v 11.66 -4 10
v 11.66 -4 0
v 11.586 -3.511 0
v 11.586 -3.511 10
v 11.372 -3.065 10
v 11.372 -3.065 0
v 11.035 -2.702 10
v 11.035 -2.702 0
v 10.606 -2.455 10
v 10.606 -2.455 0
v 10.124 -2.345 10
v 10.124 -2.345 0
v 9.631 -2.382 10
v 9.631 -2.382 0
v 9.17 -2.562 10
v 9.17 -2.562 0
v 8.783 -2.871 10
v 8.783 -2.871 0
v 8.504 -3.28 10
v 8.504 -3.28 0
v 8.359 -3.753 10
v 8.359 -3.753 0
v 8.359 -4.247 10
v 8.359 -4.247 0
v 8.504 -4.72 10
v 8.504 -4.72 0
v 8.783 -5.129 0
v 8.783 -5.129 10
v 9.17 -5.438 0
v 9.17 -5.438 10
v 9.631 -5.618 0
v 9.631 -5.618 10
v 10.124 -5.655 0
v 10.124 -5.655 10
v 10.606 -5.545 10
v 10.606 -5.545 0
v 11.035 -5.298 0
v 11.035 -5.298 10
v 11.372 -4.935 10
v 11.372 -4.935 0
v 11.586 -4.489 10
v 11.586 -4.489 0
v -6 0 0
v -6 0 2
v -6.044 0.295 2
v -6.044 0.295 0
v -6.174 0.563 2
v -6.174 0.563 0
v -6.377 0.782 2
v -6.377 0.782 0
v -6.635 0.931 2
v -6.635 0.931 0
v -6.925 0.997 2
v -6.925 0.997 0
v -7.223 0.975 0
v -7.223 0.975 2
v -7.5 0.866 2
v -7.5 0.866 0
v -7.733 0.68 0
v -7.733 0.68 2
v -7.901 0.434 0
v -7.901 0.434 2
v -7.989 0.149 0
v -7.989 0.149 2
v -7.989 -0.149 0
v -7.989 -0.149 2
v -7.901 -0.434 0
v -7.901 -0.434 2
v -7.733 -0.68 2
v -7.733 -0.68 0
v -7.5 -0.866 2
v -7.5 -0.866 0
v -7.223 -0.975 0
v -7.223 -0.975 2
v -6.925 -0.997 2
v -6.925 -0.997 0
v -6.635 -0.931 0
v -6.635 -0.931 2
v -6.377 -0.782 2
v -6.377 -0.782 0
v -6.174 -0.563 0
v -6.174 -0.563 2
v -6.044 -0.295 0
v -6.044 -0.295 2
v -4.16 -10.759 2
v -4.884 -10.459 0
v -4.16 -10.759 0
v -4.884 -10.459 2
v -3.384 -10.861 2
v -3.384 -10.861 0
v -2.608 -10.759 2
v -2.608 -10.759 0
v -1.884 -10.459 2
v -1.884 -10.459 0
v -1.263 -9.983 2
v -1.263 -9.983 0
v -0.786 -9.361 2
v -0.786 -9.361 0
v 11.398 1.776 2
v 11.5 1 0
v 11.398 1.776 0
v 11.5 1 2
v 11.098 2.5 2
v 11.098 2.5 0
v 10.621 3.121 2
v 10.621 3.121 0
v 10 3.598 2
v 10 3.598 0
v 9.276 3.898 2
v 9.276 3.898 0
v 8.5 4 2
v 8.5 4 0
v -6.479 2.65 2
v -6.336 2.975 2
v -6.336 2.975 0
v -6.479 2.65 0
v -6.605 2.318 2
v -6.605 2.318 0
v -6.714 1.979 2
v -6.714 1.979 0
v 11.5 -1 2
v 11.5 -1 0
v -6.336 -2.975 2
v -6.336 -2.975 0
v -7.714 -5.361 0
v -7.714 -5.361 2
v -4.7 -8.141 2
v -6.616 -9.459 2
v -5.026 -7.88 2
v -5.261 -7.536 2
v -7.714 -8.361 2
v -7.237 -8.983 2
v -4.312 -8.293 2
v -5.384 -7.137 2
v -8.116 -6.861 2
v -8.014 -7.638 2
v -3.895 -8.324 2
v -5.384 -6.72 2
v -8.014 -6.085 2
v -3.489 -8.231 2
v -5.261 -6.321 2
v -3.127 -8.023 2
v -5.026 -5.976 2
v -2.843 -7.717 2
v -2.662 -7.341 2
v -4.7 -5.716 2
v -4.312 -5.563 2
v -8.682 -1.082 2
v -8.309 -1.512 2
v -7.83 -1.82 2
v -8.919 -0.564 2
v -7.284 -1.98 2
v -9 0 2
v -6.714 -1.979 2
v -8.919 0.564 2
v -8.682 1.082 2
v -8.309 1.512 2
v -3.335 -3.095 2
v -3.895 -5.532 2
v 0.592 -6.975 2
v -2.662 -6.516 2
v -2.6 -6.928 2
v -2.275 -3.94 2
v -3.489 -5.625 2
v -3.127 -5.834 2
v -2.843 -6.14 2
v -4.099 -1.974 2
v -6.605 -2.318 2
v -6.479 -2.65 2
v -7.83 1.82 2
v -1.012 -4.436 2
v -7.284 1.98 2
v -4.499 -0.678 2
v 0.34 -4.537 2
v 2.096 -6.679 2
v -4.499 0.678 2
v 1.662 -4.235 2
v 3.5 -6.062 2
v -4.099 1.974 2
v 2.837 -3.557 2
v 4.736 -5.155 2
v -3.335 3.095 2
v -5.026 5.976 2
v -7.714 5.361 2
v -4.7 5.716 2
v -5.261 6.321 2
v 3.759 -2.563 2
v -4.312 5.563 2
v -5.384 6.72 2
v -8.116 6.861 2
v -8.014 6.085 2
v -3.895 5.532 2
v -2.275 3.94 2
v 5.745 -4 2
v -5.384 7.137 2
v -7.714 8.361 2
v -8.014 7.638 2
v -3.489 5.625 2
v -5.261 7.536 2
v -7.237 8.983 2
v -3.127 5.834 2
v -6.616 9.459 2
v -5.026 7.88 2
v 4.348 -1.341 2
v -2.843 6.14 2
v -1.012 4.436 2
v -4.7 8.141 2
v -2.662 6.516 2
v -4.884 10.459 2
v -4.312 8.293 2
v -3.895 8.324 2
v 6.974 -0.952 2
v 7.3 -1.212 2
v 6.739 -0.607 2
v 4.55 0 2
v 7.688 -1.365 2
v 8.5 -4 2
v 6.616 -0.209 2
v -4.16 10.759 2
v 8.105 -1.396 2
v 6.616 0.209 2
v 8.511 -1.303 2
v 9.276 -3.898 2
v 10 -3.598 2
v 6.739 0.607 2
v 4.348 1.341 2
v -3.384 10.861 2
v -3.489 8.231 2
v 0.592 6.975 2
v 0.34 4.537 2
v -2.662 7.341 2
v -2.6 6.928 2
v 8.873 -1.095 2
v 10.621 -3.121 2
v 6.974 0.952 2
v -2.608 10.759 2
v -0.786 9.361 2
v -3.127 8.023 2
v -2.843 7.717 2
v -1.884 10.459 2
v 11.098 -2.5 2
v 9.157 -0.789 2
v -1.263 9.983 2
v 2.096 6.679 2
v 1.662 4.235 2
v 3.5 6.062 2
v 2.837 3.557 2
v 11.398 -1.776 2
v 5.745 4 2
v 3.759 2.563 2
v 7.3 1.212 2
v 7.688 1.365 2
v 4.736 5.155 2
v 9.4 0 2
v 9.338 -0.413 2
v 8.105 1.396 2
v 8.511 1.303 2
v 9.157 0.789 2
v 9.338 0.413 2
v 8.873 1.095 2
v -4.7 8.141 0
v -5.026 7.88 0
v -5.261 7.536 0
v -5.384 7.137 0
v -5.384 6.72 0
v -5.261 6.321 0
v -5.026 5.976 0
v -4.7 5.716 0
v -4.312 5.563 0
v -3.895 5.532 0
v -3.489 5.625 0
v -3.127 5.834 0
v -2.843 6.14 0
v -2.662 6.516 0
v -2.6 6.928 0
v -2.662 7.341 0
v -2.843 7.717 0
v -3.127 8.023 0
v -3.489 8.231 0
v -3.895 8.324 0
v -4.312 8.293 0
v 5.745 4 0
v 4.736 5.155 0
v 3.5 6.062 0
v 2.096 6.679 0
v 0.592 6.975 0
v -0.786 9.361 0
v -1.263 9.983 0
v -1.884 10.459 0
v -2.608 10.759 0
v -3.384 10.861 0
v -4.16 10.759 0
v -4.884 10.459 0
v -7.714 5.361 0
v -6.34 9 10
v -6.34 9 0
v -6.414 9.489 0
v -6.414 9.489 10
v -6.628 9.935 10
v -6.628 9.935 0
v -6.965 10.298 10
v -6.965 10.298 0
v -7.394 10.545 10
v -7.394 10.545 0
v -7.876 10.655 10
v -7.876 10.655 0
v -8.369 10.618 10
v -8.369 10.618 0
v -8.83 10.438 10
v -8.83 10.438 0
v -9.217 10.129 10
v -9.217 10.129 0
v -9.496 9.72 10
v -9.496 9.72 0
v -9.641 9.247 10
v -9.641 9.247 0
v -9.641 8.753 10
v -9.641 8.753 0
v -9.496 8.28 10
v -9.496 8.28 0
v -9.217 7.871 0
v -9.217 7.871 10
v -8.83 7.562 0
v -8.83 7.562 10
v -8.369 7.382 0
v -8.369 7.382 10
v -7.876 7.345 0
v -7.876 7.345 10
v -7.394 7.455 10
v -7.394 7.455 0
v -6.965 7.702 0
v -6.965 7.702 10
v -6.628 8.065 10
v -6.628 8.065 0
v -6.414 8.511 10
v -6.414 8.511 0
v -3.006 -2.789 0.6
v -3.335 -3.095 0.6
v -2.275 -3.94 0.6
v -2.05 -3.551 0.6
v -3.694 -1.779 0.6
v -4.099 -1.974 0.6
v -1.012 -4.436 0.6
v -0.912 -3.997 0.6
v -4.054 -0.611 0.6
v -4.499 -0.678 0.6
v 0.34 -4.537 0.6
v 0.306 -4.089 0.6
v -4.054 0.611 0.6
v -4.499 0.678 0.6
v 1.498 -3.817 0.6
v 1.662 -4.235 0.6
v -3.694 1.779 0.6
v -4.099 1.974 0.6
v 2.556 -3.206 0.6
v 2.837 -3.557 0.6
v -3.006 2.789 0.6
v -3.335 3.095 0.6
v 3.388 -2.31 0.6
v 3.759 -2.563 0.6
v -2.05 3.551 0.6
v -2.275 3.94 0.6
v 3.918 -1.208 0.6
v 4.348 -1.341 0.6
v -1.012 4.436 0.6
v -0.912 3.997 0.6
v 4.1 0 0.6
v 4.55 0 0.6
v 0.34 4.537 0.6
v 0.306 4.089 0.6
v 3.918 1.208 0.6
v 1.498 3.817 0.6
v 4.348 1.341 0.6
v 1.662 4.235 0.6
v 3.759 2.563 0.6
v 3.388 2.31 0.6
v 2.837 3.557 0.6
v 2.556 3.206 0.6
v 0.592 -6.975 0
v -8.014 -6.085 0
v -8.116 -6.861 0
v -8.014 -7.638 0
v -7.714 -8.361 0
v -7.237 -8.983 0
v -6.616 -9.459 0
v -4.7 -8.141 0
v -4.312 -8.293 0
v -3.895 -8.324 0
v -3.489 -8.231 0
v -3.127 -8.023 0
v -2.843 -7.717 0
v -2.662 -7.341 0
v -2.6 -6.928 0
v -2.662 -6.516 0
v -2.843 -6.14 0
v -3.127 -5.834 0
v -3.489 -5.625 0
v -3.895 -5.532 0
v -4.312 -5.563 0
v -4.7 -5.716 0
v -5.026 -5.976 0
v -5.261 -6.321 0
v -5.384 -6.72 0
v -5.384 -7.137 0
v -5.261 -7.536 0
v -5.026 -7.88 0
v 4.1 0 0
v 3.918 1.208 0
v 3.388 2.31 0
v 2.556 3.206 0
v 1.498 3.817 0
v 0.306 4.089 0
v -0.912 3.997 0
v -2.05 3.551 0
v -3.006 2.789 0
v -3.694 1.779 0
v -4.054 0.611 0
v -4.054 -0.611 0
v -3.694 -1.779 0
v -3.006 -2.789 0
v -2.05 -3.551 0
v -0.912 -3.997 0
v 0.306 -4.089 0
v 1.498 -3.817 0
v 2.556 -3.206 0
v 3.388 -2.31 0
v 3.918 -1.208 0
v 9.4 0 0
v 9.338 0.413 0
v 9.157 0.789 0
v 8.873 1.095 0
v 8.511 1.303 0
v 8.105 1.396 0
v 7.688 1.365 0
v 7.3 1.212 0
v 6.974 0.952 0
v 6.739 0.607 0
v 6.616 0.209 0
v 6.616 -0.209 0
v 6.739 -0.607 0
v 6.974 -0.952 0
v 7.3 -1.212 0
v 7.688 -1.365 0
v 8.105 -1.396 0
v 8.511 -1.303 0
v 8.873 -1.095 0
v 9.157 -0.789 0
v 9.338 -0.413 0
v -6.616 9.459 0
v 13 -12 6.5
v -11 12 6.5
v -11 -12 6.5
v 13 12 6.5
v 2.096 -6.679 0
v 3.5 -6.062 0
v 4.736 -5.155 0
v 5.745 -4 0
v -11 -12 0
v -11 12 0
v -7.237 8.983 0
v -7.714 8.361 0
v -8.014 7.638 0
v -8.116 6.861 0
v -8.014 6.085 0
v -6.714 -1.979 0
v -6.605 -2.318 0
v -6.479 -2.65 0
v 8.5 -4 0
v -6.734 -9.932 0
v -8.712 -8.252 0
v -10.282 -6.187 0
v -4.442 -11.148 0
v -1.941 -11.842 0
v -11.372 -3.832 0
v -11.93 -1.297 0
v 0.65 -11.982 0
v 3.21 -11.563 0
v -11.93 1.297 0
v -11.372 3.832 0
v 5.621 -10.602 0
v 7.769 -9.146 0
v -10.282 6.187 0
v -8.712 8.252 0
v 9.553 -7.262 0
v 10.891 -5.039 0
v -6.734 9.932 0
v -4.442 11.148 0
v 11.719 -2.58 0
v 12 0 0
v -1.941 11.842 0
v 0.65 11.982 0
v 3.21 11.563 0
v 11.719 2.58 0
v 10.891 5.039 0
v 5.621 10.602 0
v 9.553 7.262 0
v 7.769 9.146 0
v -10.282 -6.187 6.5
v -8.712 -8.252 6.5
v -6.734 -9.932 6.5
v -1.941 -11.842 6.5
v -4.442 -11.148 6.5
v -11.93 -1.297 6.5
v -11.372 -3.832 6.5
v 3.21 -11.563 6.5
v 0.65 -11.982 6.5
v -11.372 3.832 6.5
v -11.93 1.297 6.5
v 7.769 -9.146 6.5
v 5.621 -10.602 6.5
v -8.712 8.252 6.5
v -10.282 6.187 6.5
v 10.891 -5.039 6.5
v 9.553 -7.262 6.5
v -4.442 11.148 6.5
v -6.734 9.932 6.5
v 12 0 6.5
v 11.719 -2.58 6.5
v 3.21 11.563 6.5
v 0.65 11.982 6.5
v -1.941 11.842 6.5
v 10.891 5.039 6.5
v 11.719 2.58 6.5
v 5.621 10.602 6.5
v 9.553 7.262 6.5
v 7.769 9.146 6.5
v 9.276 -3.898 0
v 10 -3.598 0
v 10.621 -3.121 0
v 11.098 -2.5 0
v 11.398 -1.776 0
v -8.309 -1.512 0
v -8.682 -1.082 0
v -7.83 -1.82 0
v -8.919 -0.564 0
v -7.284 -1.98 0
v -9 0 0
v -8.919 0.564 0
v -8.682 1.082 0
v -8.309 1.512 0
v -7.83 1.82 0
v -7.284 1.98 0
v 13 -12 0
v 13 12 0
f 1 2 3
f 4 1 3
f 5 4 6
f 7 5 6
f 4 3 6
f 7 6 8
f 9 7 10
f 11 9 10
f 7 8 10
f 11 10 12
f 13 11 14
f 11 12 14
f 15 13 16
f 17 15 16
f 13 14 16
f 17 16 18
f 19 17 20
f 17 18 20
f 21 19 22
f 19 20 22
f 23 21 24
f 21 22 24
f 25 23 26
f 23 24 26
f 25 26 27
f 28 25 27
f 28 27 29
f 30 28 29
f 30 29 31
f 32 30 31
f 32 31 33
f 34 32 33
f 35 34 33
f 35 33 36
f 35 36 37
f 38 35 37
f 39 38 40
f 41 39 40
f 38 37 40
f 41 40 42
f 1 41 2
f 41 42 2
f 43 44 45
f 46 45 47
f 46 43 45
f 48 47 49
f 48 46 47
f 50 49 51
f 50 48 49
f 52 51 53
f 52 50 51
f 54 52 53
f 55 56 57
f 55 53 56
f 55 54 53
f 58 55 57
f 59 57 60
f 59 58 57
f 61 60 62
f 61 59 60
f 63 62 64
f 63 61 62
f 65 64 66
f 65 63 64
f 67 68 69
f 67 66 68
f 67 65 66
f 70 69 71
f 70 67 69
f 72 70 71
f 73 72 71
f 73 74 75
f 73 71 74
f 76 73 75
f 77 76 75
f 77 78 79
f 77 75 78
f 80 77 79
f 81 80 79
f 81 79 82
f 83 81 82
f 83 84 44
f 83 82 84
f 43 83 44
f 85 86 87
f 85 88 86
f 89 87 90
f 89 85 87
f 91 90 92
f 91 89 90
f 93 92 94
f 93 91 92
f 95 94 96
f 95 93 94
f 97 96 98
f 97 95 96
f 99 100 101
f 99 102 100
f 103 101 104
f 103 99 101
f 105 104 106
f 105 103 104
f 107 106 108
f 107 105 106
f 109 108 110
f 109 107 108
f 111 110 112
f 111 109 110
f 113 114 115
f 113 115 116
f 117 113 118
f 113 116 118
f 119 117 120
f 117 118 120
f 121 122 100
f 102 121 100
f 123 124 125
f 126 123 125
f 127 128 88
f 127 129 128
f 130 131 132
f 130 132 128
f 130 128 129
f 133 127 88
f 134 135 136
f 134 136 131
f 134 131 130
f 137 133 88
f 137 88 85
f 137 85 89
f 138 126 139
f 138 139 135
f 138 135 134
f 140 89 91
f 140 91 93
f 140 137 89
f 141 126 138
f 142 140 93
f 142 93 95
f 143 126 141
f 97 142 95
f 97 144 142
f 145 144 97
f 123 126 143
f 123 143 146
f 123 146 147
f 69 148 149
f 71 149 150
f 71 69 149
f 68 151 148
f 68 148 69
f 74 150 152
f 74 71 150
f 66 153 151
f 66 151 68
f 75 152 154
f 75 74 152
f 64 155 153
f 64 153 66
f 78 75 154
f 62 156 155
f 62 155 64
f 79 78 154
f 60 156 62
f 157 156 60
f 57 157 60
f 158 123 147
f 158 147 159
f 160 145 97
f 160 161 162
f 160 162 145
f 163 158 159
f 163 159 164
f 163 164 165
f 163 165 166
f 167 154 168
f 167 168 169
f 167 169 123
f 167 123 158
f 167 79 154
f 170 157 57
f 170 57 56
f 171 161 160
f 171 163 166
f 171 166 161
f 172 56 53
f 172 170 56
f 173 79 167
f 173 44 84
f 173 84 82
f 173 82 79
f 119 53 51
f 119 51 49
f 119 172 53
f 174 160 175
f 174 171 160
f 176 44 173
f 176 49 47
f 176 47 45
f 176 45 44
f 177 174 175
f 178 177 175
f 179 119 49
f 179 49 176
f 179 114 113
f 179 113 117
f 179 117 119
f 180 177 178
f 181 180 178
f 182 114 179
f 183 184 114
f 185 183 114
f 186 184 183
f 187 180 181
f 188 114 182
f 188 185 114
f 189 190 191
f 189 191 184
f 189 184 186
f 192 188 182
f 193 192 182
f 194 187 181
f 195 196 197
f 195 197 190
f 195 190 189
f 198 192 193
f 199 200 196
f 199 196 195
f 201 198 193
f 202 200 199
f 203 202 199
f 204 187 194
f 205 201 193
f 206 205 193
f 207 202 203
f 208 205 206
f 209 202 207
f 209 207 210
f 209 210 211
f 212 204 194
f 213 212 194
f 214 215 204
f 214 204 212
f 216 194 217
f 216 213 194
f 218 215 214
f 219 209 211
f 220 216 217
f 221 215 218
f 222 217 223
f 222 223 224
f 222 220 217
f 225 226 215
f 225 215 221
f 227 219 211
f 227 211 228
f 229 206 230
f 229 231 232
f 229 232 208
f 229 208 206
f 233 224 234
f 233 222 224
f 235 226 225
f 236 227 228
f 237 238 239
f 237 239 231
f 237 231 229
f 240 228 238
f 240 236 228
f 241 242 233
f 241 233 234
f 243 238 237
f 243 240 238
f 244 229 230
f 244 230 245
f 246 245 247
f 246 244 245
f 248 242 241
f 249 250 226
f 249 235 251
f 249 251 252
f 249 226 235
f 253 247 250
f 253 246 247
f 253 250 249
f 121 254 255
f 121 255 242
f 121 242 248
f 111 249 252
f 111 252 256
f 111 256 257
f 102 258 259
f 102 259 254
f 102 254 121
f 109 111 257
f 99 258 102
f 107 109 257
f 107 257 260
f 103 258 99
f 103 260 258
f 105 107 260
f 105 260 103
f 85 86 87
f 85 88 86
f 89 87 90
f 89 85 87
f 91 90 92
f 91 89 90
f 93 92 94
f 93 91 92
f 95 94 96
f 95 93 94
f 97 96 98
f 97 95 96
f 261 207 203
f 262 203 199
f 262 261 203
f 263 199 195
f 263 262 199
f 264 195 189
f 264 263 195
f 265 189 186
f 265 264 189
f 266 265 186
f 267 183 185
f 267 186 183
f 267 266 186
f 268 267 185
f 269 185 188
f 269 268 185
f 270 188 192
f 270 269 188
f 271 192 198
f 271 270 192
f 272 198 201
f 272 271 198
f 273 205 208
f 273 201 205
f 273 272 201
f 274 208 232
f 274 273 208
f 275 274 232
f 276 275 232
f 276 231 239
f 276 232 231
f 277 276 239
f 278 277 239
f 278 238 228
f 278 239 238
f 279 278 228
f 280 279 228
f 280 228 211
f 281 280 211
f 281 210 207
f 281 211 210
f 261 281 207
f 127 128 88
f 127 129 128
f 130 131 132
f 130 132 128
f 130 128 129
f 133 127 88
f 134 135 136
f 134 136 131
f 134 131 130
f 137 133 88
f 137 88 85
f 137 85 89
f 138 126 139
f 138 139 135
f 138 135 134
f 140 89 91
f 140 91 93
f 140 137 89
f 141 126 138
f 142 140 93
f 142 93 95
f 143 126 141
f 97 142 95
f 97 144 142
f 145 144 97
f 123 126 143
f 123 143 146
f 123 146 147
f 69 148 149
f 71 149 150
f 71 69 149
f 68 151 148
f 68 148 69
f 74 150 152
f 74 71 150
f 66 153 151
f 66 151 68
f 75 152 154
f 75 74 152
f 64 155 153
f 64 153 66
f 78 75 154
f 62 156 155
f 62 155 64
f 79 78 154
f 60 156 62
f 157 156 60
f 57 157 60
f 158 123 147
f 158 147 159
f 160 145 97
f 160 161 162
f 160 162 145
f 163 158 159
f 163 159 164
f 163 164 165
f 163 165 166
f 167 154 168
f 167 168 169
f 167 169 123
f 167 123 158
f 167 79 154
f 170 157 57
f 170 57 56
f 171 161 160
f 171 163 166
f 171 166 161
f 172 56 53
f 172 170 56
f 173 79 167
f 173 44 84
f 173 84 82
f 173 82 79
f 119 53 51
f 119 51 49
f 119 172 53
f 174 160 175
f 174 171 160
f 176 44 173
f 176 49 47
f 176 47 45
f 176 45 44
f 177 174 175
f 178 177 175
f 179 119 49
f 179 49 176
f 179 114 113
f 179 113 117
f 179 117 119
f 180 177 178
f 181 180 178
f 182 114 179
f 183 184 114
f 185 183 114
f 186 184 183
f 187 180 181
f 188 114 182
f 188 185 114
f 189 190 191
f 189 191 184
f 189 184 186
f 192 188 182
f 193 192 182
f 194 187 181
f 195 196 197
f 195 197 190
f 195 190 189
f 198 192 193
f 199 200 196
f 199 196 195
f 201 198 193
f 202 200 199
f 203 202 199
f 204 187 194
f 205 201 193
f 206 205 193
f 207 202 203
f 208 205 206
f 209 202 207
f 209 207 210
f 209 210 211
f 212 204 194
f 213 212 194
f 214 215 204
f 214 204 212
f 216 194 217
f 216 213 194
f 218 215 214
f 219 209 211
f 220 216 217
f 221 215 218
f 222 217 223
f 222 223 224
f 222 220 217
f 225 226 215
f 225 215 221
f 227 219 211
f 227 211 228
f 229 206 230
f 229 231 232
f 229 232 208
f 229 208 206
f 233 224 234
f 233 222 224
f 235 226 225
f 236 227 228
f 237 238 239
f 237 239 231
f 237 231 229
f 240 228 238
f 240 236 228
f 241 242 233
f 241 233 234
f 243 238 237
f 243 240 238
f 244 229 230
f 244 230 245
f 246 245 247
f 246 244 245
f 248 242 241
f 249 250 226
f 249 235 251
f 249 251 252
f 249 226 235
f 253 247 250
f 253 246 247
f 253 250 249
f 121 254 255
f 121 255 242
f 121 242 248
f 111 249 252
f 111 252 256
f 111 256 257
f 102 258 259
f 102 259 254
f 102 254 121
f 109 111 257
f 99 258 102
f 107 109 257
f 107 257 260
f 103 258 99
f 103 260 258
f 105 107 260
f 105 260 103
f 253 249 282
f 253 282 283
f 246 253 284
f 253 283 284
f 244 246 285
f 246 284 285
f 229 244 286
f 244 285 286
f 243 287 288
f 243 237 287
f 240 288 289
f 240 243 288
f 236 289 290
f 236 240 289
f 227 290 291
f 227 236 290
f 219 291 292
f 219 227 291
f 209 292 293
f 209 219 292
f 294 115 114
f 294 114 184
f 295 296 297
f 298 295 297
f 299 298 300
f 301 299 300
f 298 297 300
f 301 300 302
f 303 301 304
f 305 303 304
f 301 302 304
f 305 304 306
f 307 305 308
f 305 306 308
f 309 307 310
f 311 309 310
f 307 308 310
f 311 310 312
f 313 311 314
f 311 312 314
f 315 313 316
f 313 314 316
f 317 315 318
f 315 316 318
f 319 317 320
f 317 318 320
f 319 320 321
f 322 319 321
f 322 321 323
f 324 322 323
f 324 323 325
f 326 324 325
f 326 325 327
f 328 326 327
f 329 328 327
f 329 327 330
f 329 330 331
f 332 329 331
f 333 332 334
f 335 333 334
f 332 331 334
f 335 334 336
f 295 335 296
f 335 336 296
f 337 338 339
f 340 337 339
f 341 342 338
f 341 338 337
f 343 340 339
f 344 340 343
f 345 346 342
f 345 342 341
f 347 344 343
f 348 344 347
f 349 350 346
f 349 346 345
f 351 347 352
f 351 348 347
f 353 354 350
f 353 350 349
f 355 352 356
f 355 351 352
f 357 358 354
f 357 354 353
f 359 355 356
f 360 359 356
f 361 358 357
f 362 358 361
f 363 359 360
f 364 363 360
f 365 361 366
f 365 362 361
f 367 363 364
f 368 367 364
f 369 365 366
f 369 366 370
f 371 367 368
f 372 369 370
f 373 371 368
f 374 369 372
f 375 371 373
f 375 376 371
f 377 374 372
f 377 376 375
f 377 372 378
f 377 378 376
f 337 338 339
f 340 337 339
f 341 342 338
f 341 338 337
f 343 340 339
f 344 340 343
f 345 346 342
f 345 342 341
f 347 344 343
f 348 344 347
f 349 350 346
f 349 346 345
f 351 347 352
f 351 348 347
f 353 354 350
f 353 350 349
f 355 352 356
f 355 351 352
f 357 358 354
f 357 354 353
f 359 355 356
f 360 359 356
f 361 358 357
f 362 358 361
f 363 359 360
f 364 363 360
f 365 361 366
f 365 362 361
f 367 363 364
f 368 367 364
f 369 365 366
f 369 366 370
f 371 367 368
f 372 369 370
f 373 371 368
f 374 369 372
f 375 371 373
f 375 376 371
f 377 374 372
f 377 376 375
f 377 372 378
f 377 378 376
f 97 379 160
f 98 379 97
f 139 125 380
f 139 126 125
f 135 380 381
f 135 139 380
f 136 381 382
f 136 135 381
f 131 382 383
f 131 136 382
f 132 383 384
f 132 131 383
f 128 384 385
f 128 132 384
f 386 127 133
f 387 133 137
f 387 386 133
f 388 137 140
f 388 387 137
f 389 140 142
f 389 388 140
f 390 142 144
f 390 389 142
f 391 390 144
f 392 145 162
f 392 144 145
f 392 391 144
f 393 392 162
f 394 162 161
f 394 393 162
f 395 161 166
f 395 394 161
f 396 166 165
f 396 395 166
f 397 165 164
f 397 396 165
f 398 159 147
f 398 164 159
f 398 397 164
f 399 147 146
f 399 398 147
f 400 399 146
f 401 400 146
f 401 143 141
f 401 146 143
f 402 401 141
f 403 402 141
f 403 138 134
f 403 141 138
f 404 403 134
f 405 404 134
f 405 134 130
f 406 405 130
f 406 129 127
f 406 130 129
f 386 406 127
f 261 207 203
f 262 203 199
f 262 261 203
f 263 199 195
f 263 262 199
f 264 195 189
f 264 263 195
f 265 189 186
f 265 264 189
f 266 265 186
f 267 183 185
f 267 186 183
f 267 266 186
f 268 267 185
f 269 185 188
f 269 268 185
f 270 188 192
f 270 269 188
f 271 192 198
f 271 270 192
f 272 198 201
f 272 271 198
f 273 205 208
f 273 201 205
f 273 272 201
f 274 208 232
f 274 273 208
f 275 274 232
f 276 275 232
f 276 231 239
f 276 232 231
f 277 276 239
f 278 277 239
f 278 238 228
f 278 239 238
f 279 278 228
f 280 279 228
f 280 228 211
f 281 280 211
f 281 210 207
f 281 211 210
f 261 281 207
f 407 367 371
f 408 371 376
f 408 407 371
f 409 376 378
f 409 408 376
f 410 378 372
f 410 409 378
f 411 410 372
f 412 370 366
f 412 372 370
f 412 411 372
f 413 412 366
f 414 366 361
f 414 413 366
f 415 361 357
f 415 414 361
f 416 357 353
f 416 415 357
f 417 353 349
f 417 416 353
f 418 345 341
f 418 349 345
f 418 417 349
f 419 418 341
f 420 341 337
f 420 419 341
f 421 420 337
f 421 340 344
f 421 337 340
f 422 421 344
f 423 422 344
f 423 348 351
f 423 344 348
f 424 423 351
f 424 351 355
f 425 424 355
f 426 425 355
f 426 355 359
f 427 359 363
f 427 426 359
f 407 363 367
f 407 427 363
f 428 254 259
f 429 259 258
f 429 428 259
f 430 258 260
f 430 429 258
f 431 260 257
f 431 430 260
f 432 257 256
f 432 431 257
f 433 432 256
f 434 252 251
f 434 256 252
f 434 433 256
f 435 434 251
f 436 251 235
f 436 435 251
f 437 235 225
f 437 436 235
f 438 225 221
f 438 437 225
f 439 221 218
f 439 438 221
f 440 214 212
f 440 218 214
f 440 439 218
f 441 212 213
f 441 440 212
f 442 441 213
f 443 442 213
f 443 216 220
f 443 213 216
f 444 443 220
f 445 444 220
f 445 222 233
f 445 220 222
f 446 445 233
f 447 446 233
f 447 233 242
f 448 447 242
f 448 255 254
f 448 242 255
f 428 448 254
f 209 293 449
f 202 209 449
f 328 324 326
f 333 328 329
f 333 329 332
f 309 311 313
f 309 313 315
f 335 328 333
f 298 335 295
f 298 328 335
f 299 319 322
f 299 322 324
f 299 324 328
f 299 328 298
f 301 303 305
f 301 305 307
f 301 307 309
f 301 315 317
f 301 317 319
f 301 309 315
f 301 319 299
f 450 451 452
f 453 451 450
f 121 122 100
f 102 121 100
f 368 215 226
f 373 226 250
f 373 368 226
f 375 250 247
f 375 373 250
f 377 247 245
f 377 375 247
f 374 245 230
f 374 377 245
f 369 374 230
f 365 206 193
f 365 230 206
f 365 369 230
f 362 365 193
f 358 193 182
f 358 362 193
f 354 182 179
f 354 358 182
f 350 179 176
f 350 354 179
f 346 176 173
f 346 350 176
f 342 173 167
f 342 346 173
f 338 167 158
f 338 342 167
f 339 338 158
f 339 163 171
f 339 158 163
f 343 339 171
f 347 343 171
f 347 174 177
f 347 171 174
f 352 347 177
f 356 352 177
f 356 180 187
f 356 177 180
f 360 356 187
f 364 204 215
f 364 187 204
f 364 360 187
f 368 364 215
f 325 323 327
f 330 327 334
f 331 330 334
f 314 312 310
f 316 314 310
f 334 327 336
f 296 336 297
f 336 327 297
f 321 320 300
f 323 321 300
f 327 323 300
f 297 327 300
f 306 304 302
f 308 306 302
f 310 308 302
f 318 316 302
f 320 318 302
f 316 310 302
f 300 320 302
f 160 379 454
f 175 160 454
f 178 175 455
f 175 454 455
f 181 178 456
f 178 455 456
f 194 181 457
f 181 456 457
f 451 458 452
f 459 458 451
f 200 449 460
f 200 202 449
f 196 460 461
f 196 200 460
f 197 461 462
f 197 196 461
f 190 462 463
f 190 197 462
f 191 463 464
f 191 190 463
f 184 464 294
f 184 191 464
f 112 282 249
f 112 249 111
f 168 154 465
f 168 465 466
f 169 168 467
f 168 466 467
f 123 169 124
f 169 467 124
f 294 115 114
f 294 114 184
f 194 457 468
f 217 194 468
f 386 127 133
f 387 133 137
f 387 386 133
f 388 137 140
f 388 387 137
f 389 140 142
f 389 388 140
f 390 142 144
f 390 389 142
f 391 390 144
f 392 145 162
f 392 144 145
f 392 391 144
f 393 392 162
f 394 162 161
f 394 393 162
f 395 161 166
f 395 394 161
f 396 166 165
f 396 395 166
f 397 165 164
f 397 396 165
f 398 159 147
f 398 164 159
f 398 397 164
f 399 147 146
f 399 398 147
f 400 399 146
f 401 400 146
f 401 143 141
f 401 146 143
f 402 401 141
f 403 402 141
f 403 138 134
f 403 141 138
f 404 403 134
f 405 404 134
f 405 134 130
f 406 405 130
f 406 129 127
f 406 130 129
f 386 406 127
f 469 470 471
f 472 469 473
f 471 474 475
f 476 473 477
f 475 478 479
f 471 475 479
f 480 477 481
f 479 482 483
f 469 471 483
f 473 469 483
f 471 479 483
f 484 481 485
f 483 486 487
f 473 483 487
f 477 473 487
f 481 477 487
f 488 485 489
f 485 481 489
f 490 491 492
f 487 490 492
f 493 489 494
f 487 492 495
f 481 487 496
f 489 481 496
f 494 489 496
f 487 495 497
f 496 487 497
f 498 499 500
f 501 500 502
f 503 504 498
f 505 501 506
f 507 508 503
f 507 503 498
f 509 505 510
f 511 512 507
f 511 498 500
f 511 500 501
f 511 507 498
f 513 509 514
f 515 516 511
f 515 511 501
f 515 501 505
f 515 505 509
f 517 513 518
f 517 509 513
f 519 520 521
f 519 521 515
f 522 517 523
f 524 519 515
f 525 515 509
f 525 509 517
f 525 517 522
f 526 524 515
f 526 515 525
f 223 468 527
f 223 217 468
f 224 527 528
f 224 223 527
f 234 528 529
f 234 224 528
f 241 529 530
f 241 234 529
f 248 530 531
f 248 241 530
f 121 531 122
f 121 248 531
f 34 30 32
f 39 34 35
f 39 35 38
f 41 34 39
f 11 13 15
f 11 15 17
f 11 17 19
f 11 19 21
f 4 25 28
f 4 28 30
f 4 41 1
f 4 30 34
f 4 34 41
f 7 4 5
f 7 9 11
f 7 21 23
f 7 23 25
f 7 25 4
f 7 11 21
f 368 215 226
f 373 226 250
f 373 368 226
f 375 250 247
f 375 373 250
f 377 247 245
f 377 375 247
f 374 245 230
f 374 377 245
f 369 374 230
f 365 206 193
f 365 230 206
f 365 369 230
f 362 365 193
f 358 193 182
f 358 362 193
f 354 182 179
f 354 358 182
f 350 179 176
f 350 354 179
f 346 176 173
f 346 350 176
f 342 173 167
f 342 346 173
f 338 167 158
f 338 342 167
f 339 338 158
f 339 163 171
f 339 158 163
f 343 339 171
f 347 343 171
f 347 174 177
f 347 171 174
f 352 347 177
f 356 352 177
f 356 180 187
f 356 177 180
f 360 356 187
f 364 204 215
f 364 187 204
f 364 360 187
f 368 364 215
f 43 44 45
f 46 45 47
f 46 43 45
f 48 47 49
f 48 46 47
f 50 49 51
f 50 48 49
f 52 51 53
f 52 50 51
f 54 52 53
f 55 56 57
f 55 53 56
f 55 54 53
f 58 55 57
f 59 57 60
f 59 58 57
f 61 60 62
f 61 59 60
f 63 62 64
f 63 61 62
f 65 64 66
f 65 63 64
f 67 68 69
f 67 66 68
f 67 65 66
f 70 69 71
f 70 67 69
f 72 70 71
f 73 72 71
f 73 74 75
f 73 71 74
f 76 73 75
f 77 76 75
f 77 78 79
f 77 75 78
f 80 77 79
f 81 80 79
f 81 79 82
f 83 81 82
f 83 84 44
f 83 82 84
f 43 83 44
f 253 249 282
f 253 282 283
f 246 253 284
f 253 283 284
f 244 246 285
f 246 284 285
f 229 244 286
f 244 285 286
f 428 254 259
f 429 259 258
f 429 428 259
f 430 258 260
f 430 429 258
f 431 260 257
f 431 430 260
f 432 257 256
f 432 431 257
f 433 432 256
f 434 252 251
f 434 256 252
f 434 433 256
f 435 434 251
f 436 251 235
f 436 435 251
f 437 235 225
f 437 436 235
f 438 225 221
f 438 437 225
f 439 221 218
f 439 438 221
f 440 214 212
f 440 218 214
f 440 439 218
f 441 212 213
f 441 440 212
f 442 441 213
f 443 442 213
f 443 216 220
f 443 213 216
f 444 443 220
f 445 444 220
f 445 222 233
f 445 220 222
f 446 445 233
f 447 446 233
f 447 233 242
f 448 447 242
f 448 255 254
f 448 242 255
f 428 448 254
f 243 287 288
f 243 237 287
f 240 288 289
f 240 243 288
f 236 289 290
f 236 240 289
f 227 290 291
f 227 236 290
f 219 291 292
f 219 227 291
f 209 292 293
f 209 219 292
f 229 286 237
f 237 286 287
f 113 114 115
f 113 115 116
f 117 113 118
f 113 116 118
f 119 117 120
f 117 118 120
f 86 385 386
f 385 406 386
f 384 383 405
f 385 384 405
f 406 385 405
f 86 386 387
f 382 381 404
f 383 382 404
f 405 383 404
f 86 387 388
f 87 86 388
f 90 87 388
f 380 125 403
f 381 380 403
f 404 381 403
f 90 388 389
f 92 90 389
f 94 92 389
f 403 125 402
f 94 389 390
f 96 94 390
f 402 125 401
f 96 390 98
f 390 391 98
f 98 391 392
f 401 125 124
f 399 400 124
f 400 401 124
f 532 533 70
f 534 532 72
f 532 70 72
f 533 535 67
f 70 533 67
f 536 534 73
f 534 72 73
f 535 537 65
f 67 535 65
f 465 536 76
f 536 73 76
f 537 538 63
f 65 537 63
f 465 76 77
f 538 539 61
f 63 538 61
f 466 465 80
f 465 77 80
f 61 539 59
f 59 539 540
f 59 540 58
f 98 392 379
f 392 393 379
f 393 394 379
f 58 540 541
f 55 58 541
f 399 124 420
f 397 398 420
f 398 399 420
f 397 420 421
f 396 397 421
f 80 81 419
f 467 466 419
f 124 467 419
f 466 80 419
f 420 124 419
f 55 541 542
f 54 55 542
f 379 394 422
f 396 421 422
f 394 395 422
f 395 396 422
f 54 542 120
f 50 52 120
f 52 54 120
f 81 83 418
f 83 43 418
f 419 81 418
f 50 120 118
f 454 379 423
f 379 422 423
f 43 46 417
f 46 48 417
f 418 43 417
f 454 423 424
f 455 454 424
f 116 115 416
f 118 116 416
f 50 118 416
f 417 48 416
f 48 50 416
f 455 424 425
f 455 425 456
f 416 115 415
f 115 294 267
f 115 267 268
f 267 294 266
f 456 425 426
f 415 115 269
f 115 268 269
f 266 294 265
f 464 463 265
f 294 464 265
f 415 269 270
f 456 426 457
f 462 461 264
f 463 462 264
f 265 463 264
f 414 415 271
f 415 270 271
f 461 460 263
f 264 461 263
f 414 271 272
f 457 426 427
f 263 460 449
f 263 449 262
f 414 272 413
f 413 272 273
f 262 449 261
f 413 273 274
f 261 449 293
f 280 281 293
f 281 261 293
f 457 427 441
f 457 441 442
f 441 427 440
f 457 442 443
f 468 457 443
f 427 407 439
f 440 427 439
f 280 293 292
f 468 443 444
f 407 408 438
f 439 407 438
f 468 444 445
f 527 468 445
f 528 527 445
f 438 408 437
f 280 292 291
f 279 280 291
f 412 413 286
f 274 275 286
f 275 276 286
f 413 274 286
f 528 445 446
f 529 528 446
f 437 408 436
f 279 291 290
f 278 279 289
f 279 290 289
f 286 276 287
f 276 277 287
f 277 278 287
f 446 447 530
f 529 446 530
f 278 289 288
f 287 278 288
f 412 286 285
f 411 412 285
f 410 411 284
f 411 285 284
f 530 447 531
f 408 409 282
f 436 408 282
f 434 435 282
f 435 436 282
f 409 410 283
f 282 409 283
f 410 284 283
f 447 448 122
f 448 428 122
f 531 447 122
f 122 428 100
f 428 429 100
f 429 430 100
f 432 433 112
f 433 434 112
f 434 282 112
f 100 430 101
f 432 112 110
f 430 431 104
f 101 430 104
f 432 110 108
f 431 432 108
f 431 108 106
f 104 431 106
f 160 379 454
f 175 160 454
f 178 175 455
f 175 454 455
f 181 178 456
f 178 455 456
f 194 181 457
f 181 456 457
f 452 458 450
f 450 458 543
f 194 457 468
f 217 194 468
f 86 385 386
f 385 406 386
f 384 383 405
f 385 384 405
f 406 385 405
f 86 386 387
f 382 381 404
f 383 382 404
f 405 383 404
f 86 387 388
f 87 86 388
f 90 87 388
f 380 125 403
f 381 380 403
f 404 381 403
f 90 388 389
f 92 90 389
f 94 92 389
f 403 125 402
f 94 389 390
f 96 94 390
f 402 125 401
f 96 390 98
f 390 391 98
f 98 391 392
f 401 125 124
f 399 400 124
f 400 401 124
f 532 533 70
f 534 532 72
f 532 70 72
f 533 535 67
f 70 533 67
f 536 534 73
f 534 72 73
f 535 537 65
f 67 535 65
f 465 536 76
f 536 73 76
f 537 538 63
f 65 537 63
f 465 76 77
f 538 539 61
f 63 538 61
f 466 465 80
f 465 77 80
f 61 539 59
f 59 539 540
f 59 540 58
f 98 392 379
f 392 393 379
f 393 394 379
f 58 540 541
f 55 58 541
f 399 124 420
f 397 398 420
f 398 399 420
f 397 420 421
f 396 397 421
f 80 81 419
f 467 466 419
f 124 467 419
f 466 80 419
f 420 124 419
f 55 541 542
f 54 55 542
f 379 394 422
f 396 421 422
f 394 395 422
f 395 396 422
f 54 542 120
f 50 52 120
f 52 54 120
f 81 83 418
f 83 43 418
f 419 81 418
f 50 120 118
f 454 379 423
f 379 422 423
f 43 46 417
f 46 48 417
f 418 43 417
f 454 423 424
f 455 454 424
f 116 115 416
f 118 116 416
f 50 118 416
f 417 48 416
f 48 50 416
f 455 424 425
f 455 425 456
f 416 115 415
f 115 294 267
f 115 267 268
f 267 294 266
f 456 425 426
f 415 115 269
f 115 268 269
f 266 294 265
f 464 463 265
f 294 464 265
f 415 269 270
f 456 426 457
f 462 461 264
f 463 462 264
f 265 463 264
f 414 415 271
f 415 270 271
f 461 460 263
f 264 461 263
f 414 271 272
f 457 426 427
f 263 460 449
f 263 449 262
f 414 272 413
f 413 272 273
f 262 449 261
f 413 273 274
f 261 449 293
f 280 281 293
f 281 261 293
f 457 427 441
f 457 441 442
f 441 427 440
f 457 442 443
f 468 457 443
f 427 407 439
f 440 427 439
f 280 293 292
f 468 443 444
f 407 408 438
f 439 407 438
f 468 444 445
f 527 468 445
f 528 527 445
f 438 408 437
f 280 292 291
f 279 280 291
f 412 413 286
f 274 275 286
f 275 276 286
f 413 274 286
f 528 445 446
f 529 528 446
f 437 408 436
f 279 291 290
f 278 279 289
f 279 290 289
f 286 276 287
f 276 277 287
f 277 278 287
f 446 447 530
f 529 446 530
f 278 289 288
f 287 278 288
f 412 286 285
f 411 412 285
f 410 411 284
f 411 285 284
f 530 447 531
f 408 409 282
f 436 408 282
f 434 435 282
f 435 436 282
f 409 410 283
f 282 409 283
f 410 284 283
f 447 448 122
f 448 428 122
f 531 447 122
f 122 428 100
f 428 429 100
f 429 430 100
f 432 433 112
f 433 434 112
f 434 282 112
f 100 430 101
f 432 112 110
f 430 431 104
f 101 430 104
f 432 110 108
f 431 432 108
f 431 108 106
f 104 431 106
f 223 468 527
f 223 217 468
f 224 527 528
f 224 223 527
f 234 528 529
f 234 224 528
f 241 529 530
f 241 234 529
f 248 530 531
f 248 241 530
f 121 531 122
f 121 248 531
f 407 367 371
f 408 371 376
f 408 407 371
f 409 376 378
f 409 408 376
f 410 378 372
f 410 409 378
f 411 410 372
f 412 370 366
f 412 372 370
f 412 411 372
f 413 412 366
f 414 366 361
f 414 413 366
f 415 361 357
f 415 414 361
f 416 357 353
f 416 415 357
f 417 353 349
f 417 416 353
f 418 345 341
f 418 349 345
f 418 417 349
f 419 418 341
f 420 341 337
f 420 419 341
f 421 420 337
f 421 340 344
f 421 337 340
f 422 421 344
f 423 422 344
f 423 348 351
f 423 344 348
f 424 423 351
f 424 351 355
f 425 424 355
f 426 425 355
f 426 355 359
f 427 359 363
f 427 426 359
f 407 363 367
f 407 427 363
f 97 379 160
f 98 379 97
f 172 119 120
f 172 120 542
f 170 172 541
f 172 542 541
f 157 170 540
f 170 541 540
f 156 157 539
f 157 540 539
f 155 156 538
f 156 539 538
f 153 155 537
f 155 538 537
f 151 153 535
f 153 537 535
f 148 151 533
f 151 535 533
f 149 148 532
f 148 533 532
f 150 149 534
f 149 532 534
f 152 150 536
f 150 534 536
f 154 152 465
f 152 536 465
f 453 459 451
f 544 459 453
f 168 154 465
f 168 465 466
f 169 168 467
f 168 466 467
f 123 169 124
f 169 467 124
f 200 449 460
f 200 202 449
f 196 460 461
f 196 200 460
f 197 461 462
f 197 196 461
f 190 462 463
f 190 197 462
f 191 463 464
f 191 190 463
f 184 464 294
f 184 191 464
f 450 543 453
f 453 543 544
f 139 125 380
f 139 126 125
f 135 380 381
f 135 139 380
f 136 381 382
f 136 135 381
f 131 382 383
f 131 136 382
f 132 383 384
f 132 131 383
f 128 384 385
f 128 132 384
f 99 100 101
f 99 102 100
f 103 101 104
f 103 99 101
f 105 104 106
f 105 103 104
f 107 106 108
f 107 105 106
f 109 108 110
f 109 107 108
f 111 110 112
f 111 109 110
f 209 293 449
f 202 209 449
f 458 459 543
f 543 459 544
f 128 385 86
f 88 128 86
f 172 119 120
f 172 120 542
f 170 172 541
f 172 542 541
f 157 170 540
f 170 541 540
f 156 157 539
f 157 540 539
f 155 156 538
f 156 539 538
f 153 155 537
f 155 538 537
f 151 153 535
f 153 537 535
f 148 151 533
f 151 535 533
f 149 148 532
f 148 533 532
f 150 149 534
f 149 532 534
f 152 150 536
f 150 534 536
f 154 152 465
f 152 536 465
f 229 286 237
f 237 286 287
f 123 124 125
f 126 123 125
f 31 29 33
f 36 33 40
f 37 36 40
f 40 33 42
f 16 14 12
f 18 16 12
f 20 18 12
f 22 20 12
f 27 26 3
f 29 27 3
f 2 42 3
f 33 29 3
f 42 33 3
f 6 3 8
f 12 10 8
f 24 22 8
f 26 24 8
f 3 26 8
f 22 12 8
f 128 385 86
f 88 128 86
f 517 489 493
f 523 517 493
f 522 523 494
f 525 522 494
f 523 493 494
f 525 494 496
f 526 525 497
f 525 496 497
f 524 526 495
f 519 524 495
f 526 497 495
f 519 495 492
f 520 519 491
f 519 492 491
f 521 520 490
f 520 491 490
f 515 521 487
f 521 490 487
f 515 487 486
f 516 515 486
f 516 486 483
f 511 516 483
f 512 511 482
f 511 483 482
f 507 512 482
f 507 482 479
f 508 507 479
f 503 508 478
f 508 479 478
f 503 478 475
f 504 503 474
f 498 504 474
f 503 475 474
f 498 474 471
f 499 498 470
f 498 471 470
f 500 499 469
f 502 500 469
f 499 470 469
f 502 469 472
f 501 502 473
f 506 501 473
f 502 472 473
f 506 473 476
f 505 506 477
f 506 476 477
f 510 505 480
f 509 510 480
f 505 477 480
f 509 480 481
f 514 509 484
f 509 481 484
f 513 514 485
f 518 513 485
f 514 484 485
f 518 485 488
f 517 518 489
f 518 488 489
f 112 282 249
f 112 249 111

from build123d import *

# Parameters (mm, degrees)
CYLINDER027_R     = 4.55
CYLINDER027_DEPTH = 10
CYLINDER026_R     = 4.1
CYLINDER026_DEPTH = 10
CYLINDER033_R     = 1
CYLINDER033_DEPTH = 10
CYLINDER024_R     = 1.4
CYLINDER024_DEPTH = 10
ARRAY_COUNT       = 3
BOX001_W          = 9
BOX001_H          = 8
BOX001_DEPTH      = 2
FILLET_R          = 3
ARRAY001_COUNT    = 3
CYLINDER023_R     = 7
CYLINDER023_DEPTH = 2
CYLINDER034_R     = 2
CYLINDER034_DEPTH = 2
CYLINDER044_R     = 12
CYLINDER044_DEPTH = 6.5
CYLINDER_R        = 1.66
CYLINDER_DEPTH    = 10
BOX_W             = 24
BOX_H             = 24
BOX_DEPTH         = 6.5
CYLINDER045_R     = 1.66
CYLINDER045_DEPTH = 10
CYLINDER049_R     = 4.55
CYLINDER049_DEPTH = 10
CYLINDER048_R     = 4.1
CYLINDER048_DEPTH = 10
CYLINDER046_R     = 1
CYLINDER046_DEPTH = 10
CYLINDER047_R     = 1.4
CYLINDER047_DEPTH = 10
ARRAY002_COUNT    = 3
BOX002_W          = 9
BOX002_H          = 8
BOX002_DEPTH      = 2
FILLET001_R       = 3
ARRAY003_COUNT    = 3
CYLINDER050_R     = 7
CYLINDER050_DEPTH = 2
CYLINDER051_R     = 2
CYLINDER051_DEPTH = 2


with BuildPart() as mountplatelip:
    # Cylinder027 → Cylinder027 (new body)
    with BuildSketch(Plane.XY.offset(0.6)):
        Circle(CYLINDER027_R)
    extrude(amount=CYLINDER027_DEPTH)


with BuildPart() as mountplateinnerhole:
    # Cylinder026 → Cylinder026 (new body)
    with BuildSketch(Plane.XY):
        Circle(CYLINDER026_R)
    extrude(amount=CYLINDER026_DEPTH)


with BuildPart() as cylinder018:
    # Cylinder033 → Cylinder033 (new body)
    with BuildSketch(Plane(origin=(-7, 0, 0), x_dir=(1, 0, 0), z_dir=(0, 0, 1))):
        Circle(CYLINDER033_R)
    extrude(amount=CYLINDER033_DEPTH)


with BuildPart() as fusion009:
    # Cylinder024 → Cylinder024 (new body)
    with BuildSketch(Plane(origin=(8, 0, 0), x_dir=(1, 0, 0), z_dir=(0, 0, 1))):
        Circle(CYLINDER024_R)
    extrude(amount=CYLINDER024_DEPTH)

    # Array: Fusion009 ×3 about axis
    array_axis = Axis((0, 0, 0), (0, 0, 1))


with BuildPart() as fusion009_1:
    add(fusion009.part)
    for i in range(1, ARRAY_COUNT):
        add(fusion009.part.rotate(array_axis, i * 360 / ARRAY_COUNT))

    # Fusion009: union MountPlateLip, MountPlateInnerHole, Cylinder018
    add(mountplatelip.part)
    add(mountplateinnerhole.part)
    add(cylinder018.part)


with BuildPart() as array001:
    # Box001 → Box001 (new body)
    with BuildSketch(Plane(origin=(2.5, -4, 0), x_dir=(1, 0, 0), z_dir=(0, 0, 1))):
        with Locations((4.5, 4)):
            Rectangle(BOX001_W, BOX001_H)
    extrude(amount=BOX001_DEPTH)

    # Fillet
    fillet_edges = [array001.edges().sort_by_distance(p)[0] for p in [
        (11.5, -4, 1),
        (11.5, 4, 1),
    ]]
    fillet(fillet_edges, radius=FILLET_R)

    # Array001: Array001 ×3 about axis
    array001_axis = Axis((0, 0, 0), (0, 0, 1))


with BuildPart() as array001_1:
    add(array001.part)
    for i in range(1, ARRAY001_COUNT):
        add(array001.part.rotate(array001_axis, i * 360 / ARRAY001_COUNT))


with BuildPart() as mountplatebody:
    # Cylinder023 → Cylinder023 (new body)
    with BuildSketch(Plane.XY):
        Circle(CYLINDER023_R)
    extrude(amount=CYLINDER023_DEPTH)


with BuildPart() as cut010:
    # Cylinder034 → Cylinder034 (new body)
    with BuildSketch(Plane(origin=(-7, 0, 0), x_dir=(1, 0, 0), z_dir=(0, 0, 1))):
        Circle(CYLINDER034_R)
    extrude(amount=CYLINDER034_DEPTH)

    # Fusion008: union Array001, MountPlateBody
    add(array001_1.part)
    add(mountplatebody.part)

    # Cut010: cut Fusion009
    add(fusion009_1.part, mode=Mode.SUBTRACT)


with BuildPart() as cylinder026:
    # Cylinder044 → Cylinder044 (new body)
    with BuildSketch(Plane.XY):
        Circle(CYLINDER044_R)
    extrude(amount=CYLINDER044_DEPTH)


with BuildPart() as sprue:
    # Cylinder → Cylinder (new body)
    with BuildSketch(Plane(origin=(10, -4, 0), x_dir=(1, 0, 0), z_dir=(0, 0, 1))):
        Circle(CYLINDER_R)
    extrude(amount=CYLINDER_DEPTH)


with BuildPart() as cube:
    # Box → Box (new body)
    with BuildSketch(Plane(origin=(-11, -12, 0), x_dir=(1, 0, 0), z_dir=(0, 0, 1))):
        with Locations((12, 12)):
            Rectangle(BOX_W, BOX_H)
    extrude(amount=BOX_DEPTH)


with BuildPart() as sprue001:
    # Cylinder045 → Cylinder045 (new body)
    with BuildSketch(Plane(origin=(-8, 9, 0), x_dir=(1, 0, 0), z_dir=(0, 0, 1))):
        Circle(CYLINDER045_R)
    extrude(amount=CYLINDER045_DEPTH)


with BuildPart() as mountplatelip001:
    # Cylinder049 → Cylinder049 (new body)
    with BuildSketch(Plane.XY.offset(0.6)):
        Circle(CYLINDER049_R)
    extrude(amount=CYLINDER049_DEPTH)


with BuildPart() as mountplateinnerhole001:
    # Cylinder048 → Cylinder048 (new body)
    with BuildSketch(Plane.XY):
        Circle(CYLINDER048_R)
    extrude(amount=CYLINDER048_DEPTH)


with BuildPart() as cylinder027:
    # Cylinder046 → Cylinder046 (new body)
    with BuildSketch(Plane(origin=(-7, 0, 0), x_dir=(1, 0, 0), z_dir=(0, 0, 1))):
        Circle(CYLINDER046_R)
    extrude(amount=CYLINDER046_DEPTH)


with BuildPart() as fusion011:
    # Cylinder047 → Cylinder047 (new body)
    with BuildSketch(Plane(origin=(8, 0, 0), x_dir=(1, 0, 0), z_dir=(0, 0, 1))):
        Circle(CYLINDER047_R)
    extrude(amount=CYLINDER047_DEPTH)

    # Array002: Fusion011 ×3 about axis
    array002_axis = Axis((0, 0, 0), (0, 0, 1))


with BuildPart() as fusion011_1:
    add(fusion011.part)
    for i in range(1, ARRAY002_COUNT):
        add(fusion011.part.rotate(array002_axis, i * 360 / ARRAY002_COUNT))

    # Fusion011: union MountPlateLip001, MountPlateInnerHole001, Cylinder027
    add(mountplatelip001.part)
    add(mountplateinnerhole001.part)
    add(cylinder027.part)


with BuildPart() as array003:
    # Box002 → Box002 (new body)
    with BuildSketch(Plane(origin=(2.5, -4, 0), x_dir=(1, 0, 0), z_dir=(0, 0, 1))):
        with Locations((4.5, 4)):
            Rectangle(BOX002_W, BOX002_H)
    extrude(amount=BOX002_DEPTH)

    # Fillet001
    fillet001_edges = [array003.edges().sort_by_distance(p)[0] for p in [
        (11.5, -4, 1),
        (11.5, 4, 1),
    ]]
    fillet(fillet001_edges, radius=FILLET001_R)

    # Array003: Array003 ×3 about axis
    array003_axis = Axis((0, 0, 0), (0, 0, 1))


with BuildPart() as array003_1:
    add(array003.part)
    for i in range(1, ARRAY003_COUNT):
        add(array003.part.rotate(array003_axis, i * 360 / ARRAY003_COUNT))


with BuildPart() as mountplatebody001:
    # Cylinder050 → Cylinder050 (new body)
    with BuildSketch(Plane.XY):
        Circle(CYLINDER050_R)
    extrude(amount=CYLINDER050_DEPTH)


with BuildPart() as cut011:
    # Cylinder051 → Cylinder051 (new body)
    with BuildSketch(Plane(origin=(-7, 0, 0), x_dir=(1, 0, 0), z_dir=(0, 0, 1))):
        Circle(CYLINDER051_R)
    extrude(amount=CYLINDER051_DEPTH)

    # Fusion010: union Array003, MountPlateBody001
    add(array003_1.part)
    add(mountplatebody001.part)

    # Cut011: cut Fusion011
    add(fusion011_1.part, mode=Mode.SUBTRACT)


solid = Compound([cut010.part, cylinder026.part, sprue.part, cube.part, sprue001.part, cut011.part])
